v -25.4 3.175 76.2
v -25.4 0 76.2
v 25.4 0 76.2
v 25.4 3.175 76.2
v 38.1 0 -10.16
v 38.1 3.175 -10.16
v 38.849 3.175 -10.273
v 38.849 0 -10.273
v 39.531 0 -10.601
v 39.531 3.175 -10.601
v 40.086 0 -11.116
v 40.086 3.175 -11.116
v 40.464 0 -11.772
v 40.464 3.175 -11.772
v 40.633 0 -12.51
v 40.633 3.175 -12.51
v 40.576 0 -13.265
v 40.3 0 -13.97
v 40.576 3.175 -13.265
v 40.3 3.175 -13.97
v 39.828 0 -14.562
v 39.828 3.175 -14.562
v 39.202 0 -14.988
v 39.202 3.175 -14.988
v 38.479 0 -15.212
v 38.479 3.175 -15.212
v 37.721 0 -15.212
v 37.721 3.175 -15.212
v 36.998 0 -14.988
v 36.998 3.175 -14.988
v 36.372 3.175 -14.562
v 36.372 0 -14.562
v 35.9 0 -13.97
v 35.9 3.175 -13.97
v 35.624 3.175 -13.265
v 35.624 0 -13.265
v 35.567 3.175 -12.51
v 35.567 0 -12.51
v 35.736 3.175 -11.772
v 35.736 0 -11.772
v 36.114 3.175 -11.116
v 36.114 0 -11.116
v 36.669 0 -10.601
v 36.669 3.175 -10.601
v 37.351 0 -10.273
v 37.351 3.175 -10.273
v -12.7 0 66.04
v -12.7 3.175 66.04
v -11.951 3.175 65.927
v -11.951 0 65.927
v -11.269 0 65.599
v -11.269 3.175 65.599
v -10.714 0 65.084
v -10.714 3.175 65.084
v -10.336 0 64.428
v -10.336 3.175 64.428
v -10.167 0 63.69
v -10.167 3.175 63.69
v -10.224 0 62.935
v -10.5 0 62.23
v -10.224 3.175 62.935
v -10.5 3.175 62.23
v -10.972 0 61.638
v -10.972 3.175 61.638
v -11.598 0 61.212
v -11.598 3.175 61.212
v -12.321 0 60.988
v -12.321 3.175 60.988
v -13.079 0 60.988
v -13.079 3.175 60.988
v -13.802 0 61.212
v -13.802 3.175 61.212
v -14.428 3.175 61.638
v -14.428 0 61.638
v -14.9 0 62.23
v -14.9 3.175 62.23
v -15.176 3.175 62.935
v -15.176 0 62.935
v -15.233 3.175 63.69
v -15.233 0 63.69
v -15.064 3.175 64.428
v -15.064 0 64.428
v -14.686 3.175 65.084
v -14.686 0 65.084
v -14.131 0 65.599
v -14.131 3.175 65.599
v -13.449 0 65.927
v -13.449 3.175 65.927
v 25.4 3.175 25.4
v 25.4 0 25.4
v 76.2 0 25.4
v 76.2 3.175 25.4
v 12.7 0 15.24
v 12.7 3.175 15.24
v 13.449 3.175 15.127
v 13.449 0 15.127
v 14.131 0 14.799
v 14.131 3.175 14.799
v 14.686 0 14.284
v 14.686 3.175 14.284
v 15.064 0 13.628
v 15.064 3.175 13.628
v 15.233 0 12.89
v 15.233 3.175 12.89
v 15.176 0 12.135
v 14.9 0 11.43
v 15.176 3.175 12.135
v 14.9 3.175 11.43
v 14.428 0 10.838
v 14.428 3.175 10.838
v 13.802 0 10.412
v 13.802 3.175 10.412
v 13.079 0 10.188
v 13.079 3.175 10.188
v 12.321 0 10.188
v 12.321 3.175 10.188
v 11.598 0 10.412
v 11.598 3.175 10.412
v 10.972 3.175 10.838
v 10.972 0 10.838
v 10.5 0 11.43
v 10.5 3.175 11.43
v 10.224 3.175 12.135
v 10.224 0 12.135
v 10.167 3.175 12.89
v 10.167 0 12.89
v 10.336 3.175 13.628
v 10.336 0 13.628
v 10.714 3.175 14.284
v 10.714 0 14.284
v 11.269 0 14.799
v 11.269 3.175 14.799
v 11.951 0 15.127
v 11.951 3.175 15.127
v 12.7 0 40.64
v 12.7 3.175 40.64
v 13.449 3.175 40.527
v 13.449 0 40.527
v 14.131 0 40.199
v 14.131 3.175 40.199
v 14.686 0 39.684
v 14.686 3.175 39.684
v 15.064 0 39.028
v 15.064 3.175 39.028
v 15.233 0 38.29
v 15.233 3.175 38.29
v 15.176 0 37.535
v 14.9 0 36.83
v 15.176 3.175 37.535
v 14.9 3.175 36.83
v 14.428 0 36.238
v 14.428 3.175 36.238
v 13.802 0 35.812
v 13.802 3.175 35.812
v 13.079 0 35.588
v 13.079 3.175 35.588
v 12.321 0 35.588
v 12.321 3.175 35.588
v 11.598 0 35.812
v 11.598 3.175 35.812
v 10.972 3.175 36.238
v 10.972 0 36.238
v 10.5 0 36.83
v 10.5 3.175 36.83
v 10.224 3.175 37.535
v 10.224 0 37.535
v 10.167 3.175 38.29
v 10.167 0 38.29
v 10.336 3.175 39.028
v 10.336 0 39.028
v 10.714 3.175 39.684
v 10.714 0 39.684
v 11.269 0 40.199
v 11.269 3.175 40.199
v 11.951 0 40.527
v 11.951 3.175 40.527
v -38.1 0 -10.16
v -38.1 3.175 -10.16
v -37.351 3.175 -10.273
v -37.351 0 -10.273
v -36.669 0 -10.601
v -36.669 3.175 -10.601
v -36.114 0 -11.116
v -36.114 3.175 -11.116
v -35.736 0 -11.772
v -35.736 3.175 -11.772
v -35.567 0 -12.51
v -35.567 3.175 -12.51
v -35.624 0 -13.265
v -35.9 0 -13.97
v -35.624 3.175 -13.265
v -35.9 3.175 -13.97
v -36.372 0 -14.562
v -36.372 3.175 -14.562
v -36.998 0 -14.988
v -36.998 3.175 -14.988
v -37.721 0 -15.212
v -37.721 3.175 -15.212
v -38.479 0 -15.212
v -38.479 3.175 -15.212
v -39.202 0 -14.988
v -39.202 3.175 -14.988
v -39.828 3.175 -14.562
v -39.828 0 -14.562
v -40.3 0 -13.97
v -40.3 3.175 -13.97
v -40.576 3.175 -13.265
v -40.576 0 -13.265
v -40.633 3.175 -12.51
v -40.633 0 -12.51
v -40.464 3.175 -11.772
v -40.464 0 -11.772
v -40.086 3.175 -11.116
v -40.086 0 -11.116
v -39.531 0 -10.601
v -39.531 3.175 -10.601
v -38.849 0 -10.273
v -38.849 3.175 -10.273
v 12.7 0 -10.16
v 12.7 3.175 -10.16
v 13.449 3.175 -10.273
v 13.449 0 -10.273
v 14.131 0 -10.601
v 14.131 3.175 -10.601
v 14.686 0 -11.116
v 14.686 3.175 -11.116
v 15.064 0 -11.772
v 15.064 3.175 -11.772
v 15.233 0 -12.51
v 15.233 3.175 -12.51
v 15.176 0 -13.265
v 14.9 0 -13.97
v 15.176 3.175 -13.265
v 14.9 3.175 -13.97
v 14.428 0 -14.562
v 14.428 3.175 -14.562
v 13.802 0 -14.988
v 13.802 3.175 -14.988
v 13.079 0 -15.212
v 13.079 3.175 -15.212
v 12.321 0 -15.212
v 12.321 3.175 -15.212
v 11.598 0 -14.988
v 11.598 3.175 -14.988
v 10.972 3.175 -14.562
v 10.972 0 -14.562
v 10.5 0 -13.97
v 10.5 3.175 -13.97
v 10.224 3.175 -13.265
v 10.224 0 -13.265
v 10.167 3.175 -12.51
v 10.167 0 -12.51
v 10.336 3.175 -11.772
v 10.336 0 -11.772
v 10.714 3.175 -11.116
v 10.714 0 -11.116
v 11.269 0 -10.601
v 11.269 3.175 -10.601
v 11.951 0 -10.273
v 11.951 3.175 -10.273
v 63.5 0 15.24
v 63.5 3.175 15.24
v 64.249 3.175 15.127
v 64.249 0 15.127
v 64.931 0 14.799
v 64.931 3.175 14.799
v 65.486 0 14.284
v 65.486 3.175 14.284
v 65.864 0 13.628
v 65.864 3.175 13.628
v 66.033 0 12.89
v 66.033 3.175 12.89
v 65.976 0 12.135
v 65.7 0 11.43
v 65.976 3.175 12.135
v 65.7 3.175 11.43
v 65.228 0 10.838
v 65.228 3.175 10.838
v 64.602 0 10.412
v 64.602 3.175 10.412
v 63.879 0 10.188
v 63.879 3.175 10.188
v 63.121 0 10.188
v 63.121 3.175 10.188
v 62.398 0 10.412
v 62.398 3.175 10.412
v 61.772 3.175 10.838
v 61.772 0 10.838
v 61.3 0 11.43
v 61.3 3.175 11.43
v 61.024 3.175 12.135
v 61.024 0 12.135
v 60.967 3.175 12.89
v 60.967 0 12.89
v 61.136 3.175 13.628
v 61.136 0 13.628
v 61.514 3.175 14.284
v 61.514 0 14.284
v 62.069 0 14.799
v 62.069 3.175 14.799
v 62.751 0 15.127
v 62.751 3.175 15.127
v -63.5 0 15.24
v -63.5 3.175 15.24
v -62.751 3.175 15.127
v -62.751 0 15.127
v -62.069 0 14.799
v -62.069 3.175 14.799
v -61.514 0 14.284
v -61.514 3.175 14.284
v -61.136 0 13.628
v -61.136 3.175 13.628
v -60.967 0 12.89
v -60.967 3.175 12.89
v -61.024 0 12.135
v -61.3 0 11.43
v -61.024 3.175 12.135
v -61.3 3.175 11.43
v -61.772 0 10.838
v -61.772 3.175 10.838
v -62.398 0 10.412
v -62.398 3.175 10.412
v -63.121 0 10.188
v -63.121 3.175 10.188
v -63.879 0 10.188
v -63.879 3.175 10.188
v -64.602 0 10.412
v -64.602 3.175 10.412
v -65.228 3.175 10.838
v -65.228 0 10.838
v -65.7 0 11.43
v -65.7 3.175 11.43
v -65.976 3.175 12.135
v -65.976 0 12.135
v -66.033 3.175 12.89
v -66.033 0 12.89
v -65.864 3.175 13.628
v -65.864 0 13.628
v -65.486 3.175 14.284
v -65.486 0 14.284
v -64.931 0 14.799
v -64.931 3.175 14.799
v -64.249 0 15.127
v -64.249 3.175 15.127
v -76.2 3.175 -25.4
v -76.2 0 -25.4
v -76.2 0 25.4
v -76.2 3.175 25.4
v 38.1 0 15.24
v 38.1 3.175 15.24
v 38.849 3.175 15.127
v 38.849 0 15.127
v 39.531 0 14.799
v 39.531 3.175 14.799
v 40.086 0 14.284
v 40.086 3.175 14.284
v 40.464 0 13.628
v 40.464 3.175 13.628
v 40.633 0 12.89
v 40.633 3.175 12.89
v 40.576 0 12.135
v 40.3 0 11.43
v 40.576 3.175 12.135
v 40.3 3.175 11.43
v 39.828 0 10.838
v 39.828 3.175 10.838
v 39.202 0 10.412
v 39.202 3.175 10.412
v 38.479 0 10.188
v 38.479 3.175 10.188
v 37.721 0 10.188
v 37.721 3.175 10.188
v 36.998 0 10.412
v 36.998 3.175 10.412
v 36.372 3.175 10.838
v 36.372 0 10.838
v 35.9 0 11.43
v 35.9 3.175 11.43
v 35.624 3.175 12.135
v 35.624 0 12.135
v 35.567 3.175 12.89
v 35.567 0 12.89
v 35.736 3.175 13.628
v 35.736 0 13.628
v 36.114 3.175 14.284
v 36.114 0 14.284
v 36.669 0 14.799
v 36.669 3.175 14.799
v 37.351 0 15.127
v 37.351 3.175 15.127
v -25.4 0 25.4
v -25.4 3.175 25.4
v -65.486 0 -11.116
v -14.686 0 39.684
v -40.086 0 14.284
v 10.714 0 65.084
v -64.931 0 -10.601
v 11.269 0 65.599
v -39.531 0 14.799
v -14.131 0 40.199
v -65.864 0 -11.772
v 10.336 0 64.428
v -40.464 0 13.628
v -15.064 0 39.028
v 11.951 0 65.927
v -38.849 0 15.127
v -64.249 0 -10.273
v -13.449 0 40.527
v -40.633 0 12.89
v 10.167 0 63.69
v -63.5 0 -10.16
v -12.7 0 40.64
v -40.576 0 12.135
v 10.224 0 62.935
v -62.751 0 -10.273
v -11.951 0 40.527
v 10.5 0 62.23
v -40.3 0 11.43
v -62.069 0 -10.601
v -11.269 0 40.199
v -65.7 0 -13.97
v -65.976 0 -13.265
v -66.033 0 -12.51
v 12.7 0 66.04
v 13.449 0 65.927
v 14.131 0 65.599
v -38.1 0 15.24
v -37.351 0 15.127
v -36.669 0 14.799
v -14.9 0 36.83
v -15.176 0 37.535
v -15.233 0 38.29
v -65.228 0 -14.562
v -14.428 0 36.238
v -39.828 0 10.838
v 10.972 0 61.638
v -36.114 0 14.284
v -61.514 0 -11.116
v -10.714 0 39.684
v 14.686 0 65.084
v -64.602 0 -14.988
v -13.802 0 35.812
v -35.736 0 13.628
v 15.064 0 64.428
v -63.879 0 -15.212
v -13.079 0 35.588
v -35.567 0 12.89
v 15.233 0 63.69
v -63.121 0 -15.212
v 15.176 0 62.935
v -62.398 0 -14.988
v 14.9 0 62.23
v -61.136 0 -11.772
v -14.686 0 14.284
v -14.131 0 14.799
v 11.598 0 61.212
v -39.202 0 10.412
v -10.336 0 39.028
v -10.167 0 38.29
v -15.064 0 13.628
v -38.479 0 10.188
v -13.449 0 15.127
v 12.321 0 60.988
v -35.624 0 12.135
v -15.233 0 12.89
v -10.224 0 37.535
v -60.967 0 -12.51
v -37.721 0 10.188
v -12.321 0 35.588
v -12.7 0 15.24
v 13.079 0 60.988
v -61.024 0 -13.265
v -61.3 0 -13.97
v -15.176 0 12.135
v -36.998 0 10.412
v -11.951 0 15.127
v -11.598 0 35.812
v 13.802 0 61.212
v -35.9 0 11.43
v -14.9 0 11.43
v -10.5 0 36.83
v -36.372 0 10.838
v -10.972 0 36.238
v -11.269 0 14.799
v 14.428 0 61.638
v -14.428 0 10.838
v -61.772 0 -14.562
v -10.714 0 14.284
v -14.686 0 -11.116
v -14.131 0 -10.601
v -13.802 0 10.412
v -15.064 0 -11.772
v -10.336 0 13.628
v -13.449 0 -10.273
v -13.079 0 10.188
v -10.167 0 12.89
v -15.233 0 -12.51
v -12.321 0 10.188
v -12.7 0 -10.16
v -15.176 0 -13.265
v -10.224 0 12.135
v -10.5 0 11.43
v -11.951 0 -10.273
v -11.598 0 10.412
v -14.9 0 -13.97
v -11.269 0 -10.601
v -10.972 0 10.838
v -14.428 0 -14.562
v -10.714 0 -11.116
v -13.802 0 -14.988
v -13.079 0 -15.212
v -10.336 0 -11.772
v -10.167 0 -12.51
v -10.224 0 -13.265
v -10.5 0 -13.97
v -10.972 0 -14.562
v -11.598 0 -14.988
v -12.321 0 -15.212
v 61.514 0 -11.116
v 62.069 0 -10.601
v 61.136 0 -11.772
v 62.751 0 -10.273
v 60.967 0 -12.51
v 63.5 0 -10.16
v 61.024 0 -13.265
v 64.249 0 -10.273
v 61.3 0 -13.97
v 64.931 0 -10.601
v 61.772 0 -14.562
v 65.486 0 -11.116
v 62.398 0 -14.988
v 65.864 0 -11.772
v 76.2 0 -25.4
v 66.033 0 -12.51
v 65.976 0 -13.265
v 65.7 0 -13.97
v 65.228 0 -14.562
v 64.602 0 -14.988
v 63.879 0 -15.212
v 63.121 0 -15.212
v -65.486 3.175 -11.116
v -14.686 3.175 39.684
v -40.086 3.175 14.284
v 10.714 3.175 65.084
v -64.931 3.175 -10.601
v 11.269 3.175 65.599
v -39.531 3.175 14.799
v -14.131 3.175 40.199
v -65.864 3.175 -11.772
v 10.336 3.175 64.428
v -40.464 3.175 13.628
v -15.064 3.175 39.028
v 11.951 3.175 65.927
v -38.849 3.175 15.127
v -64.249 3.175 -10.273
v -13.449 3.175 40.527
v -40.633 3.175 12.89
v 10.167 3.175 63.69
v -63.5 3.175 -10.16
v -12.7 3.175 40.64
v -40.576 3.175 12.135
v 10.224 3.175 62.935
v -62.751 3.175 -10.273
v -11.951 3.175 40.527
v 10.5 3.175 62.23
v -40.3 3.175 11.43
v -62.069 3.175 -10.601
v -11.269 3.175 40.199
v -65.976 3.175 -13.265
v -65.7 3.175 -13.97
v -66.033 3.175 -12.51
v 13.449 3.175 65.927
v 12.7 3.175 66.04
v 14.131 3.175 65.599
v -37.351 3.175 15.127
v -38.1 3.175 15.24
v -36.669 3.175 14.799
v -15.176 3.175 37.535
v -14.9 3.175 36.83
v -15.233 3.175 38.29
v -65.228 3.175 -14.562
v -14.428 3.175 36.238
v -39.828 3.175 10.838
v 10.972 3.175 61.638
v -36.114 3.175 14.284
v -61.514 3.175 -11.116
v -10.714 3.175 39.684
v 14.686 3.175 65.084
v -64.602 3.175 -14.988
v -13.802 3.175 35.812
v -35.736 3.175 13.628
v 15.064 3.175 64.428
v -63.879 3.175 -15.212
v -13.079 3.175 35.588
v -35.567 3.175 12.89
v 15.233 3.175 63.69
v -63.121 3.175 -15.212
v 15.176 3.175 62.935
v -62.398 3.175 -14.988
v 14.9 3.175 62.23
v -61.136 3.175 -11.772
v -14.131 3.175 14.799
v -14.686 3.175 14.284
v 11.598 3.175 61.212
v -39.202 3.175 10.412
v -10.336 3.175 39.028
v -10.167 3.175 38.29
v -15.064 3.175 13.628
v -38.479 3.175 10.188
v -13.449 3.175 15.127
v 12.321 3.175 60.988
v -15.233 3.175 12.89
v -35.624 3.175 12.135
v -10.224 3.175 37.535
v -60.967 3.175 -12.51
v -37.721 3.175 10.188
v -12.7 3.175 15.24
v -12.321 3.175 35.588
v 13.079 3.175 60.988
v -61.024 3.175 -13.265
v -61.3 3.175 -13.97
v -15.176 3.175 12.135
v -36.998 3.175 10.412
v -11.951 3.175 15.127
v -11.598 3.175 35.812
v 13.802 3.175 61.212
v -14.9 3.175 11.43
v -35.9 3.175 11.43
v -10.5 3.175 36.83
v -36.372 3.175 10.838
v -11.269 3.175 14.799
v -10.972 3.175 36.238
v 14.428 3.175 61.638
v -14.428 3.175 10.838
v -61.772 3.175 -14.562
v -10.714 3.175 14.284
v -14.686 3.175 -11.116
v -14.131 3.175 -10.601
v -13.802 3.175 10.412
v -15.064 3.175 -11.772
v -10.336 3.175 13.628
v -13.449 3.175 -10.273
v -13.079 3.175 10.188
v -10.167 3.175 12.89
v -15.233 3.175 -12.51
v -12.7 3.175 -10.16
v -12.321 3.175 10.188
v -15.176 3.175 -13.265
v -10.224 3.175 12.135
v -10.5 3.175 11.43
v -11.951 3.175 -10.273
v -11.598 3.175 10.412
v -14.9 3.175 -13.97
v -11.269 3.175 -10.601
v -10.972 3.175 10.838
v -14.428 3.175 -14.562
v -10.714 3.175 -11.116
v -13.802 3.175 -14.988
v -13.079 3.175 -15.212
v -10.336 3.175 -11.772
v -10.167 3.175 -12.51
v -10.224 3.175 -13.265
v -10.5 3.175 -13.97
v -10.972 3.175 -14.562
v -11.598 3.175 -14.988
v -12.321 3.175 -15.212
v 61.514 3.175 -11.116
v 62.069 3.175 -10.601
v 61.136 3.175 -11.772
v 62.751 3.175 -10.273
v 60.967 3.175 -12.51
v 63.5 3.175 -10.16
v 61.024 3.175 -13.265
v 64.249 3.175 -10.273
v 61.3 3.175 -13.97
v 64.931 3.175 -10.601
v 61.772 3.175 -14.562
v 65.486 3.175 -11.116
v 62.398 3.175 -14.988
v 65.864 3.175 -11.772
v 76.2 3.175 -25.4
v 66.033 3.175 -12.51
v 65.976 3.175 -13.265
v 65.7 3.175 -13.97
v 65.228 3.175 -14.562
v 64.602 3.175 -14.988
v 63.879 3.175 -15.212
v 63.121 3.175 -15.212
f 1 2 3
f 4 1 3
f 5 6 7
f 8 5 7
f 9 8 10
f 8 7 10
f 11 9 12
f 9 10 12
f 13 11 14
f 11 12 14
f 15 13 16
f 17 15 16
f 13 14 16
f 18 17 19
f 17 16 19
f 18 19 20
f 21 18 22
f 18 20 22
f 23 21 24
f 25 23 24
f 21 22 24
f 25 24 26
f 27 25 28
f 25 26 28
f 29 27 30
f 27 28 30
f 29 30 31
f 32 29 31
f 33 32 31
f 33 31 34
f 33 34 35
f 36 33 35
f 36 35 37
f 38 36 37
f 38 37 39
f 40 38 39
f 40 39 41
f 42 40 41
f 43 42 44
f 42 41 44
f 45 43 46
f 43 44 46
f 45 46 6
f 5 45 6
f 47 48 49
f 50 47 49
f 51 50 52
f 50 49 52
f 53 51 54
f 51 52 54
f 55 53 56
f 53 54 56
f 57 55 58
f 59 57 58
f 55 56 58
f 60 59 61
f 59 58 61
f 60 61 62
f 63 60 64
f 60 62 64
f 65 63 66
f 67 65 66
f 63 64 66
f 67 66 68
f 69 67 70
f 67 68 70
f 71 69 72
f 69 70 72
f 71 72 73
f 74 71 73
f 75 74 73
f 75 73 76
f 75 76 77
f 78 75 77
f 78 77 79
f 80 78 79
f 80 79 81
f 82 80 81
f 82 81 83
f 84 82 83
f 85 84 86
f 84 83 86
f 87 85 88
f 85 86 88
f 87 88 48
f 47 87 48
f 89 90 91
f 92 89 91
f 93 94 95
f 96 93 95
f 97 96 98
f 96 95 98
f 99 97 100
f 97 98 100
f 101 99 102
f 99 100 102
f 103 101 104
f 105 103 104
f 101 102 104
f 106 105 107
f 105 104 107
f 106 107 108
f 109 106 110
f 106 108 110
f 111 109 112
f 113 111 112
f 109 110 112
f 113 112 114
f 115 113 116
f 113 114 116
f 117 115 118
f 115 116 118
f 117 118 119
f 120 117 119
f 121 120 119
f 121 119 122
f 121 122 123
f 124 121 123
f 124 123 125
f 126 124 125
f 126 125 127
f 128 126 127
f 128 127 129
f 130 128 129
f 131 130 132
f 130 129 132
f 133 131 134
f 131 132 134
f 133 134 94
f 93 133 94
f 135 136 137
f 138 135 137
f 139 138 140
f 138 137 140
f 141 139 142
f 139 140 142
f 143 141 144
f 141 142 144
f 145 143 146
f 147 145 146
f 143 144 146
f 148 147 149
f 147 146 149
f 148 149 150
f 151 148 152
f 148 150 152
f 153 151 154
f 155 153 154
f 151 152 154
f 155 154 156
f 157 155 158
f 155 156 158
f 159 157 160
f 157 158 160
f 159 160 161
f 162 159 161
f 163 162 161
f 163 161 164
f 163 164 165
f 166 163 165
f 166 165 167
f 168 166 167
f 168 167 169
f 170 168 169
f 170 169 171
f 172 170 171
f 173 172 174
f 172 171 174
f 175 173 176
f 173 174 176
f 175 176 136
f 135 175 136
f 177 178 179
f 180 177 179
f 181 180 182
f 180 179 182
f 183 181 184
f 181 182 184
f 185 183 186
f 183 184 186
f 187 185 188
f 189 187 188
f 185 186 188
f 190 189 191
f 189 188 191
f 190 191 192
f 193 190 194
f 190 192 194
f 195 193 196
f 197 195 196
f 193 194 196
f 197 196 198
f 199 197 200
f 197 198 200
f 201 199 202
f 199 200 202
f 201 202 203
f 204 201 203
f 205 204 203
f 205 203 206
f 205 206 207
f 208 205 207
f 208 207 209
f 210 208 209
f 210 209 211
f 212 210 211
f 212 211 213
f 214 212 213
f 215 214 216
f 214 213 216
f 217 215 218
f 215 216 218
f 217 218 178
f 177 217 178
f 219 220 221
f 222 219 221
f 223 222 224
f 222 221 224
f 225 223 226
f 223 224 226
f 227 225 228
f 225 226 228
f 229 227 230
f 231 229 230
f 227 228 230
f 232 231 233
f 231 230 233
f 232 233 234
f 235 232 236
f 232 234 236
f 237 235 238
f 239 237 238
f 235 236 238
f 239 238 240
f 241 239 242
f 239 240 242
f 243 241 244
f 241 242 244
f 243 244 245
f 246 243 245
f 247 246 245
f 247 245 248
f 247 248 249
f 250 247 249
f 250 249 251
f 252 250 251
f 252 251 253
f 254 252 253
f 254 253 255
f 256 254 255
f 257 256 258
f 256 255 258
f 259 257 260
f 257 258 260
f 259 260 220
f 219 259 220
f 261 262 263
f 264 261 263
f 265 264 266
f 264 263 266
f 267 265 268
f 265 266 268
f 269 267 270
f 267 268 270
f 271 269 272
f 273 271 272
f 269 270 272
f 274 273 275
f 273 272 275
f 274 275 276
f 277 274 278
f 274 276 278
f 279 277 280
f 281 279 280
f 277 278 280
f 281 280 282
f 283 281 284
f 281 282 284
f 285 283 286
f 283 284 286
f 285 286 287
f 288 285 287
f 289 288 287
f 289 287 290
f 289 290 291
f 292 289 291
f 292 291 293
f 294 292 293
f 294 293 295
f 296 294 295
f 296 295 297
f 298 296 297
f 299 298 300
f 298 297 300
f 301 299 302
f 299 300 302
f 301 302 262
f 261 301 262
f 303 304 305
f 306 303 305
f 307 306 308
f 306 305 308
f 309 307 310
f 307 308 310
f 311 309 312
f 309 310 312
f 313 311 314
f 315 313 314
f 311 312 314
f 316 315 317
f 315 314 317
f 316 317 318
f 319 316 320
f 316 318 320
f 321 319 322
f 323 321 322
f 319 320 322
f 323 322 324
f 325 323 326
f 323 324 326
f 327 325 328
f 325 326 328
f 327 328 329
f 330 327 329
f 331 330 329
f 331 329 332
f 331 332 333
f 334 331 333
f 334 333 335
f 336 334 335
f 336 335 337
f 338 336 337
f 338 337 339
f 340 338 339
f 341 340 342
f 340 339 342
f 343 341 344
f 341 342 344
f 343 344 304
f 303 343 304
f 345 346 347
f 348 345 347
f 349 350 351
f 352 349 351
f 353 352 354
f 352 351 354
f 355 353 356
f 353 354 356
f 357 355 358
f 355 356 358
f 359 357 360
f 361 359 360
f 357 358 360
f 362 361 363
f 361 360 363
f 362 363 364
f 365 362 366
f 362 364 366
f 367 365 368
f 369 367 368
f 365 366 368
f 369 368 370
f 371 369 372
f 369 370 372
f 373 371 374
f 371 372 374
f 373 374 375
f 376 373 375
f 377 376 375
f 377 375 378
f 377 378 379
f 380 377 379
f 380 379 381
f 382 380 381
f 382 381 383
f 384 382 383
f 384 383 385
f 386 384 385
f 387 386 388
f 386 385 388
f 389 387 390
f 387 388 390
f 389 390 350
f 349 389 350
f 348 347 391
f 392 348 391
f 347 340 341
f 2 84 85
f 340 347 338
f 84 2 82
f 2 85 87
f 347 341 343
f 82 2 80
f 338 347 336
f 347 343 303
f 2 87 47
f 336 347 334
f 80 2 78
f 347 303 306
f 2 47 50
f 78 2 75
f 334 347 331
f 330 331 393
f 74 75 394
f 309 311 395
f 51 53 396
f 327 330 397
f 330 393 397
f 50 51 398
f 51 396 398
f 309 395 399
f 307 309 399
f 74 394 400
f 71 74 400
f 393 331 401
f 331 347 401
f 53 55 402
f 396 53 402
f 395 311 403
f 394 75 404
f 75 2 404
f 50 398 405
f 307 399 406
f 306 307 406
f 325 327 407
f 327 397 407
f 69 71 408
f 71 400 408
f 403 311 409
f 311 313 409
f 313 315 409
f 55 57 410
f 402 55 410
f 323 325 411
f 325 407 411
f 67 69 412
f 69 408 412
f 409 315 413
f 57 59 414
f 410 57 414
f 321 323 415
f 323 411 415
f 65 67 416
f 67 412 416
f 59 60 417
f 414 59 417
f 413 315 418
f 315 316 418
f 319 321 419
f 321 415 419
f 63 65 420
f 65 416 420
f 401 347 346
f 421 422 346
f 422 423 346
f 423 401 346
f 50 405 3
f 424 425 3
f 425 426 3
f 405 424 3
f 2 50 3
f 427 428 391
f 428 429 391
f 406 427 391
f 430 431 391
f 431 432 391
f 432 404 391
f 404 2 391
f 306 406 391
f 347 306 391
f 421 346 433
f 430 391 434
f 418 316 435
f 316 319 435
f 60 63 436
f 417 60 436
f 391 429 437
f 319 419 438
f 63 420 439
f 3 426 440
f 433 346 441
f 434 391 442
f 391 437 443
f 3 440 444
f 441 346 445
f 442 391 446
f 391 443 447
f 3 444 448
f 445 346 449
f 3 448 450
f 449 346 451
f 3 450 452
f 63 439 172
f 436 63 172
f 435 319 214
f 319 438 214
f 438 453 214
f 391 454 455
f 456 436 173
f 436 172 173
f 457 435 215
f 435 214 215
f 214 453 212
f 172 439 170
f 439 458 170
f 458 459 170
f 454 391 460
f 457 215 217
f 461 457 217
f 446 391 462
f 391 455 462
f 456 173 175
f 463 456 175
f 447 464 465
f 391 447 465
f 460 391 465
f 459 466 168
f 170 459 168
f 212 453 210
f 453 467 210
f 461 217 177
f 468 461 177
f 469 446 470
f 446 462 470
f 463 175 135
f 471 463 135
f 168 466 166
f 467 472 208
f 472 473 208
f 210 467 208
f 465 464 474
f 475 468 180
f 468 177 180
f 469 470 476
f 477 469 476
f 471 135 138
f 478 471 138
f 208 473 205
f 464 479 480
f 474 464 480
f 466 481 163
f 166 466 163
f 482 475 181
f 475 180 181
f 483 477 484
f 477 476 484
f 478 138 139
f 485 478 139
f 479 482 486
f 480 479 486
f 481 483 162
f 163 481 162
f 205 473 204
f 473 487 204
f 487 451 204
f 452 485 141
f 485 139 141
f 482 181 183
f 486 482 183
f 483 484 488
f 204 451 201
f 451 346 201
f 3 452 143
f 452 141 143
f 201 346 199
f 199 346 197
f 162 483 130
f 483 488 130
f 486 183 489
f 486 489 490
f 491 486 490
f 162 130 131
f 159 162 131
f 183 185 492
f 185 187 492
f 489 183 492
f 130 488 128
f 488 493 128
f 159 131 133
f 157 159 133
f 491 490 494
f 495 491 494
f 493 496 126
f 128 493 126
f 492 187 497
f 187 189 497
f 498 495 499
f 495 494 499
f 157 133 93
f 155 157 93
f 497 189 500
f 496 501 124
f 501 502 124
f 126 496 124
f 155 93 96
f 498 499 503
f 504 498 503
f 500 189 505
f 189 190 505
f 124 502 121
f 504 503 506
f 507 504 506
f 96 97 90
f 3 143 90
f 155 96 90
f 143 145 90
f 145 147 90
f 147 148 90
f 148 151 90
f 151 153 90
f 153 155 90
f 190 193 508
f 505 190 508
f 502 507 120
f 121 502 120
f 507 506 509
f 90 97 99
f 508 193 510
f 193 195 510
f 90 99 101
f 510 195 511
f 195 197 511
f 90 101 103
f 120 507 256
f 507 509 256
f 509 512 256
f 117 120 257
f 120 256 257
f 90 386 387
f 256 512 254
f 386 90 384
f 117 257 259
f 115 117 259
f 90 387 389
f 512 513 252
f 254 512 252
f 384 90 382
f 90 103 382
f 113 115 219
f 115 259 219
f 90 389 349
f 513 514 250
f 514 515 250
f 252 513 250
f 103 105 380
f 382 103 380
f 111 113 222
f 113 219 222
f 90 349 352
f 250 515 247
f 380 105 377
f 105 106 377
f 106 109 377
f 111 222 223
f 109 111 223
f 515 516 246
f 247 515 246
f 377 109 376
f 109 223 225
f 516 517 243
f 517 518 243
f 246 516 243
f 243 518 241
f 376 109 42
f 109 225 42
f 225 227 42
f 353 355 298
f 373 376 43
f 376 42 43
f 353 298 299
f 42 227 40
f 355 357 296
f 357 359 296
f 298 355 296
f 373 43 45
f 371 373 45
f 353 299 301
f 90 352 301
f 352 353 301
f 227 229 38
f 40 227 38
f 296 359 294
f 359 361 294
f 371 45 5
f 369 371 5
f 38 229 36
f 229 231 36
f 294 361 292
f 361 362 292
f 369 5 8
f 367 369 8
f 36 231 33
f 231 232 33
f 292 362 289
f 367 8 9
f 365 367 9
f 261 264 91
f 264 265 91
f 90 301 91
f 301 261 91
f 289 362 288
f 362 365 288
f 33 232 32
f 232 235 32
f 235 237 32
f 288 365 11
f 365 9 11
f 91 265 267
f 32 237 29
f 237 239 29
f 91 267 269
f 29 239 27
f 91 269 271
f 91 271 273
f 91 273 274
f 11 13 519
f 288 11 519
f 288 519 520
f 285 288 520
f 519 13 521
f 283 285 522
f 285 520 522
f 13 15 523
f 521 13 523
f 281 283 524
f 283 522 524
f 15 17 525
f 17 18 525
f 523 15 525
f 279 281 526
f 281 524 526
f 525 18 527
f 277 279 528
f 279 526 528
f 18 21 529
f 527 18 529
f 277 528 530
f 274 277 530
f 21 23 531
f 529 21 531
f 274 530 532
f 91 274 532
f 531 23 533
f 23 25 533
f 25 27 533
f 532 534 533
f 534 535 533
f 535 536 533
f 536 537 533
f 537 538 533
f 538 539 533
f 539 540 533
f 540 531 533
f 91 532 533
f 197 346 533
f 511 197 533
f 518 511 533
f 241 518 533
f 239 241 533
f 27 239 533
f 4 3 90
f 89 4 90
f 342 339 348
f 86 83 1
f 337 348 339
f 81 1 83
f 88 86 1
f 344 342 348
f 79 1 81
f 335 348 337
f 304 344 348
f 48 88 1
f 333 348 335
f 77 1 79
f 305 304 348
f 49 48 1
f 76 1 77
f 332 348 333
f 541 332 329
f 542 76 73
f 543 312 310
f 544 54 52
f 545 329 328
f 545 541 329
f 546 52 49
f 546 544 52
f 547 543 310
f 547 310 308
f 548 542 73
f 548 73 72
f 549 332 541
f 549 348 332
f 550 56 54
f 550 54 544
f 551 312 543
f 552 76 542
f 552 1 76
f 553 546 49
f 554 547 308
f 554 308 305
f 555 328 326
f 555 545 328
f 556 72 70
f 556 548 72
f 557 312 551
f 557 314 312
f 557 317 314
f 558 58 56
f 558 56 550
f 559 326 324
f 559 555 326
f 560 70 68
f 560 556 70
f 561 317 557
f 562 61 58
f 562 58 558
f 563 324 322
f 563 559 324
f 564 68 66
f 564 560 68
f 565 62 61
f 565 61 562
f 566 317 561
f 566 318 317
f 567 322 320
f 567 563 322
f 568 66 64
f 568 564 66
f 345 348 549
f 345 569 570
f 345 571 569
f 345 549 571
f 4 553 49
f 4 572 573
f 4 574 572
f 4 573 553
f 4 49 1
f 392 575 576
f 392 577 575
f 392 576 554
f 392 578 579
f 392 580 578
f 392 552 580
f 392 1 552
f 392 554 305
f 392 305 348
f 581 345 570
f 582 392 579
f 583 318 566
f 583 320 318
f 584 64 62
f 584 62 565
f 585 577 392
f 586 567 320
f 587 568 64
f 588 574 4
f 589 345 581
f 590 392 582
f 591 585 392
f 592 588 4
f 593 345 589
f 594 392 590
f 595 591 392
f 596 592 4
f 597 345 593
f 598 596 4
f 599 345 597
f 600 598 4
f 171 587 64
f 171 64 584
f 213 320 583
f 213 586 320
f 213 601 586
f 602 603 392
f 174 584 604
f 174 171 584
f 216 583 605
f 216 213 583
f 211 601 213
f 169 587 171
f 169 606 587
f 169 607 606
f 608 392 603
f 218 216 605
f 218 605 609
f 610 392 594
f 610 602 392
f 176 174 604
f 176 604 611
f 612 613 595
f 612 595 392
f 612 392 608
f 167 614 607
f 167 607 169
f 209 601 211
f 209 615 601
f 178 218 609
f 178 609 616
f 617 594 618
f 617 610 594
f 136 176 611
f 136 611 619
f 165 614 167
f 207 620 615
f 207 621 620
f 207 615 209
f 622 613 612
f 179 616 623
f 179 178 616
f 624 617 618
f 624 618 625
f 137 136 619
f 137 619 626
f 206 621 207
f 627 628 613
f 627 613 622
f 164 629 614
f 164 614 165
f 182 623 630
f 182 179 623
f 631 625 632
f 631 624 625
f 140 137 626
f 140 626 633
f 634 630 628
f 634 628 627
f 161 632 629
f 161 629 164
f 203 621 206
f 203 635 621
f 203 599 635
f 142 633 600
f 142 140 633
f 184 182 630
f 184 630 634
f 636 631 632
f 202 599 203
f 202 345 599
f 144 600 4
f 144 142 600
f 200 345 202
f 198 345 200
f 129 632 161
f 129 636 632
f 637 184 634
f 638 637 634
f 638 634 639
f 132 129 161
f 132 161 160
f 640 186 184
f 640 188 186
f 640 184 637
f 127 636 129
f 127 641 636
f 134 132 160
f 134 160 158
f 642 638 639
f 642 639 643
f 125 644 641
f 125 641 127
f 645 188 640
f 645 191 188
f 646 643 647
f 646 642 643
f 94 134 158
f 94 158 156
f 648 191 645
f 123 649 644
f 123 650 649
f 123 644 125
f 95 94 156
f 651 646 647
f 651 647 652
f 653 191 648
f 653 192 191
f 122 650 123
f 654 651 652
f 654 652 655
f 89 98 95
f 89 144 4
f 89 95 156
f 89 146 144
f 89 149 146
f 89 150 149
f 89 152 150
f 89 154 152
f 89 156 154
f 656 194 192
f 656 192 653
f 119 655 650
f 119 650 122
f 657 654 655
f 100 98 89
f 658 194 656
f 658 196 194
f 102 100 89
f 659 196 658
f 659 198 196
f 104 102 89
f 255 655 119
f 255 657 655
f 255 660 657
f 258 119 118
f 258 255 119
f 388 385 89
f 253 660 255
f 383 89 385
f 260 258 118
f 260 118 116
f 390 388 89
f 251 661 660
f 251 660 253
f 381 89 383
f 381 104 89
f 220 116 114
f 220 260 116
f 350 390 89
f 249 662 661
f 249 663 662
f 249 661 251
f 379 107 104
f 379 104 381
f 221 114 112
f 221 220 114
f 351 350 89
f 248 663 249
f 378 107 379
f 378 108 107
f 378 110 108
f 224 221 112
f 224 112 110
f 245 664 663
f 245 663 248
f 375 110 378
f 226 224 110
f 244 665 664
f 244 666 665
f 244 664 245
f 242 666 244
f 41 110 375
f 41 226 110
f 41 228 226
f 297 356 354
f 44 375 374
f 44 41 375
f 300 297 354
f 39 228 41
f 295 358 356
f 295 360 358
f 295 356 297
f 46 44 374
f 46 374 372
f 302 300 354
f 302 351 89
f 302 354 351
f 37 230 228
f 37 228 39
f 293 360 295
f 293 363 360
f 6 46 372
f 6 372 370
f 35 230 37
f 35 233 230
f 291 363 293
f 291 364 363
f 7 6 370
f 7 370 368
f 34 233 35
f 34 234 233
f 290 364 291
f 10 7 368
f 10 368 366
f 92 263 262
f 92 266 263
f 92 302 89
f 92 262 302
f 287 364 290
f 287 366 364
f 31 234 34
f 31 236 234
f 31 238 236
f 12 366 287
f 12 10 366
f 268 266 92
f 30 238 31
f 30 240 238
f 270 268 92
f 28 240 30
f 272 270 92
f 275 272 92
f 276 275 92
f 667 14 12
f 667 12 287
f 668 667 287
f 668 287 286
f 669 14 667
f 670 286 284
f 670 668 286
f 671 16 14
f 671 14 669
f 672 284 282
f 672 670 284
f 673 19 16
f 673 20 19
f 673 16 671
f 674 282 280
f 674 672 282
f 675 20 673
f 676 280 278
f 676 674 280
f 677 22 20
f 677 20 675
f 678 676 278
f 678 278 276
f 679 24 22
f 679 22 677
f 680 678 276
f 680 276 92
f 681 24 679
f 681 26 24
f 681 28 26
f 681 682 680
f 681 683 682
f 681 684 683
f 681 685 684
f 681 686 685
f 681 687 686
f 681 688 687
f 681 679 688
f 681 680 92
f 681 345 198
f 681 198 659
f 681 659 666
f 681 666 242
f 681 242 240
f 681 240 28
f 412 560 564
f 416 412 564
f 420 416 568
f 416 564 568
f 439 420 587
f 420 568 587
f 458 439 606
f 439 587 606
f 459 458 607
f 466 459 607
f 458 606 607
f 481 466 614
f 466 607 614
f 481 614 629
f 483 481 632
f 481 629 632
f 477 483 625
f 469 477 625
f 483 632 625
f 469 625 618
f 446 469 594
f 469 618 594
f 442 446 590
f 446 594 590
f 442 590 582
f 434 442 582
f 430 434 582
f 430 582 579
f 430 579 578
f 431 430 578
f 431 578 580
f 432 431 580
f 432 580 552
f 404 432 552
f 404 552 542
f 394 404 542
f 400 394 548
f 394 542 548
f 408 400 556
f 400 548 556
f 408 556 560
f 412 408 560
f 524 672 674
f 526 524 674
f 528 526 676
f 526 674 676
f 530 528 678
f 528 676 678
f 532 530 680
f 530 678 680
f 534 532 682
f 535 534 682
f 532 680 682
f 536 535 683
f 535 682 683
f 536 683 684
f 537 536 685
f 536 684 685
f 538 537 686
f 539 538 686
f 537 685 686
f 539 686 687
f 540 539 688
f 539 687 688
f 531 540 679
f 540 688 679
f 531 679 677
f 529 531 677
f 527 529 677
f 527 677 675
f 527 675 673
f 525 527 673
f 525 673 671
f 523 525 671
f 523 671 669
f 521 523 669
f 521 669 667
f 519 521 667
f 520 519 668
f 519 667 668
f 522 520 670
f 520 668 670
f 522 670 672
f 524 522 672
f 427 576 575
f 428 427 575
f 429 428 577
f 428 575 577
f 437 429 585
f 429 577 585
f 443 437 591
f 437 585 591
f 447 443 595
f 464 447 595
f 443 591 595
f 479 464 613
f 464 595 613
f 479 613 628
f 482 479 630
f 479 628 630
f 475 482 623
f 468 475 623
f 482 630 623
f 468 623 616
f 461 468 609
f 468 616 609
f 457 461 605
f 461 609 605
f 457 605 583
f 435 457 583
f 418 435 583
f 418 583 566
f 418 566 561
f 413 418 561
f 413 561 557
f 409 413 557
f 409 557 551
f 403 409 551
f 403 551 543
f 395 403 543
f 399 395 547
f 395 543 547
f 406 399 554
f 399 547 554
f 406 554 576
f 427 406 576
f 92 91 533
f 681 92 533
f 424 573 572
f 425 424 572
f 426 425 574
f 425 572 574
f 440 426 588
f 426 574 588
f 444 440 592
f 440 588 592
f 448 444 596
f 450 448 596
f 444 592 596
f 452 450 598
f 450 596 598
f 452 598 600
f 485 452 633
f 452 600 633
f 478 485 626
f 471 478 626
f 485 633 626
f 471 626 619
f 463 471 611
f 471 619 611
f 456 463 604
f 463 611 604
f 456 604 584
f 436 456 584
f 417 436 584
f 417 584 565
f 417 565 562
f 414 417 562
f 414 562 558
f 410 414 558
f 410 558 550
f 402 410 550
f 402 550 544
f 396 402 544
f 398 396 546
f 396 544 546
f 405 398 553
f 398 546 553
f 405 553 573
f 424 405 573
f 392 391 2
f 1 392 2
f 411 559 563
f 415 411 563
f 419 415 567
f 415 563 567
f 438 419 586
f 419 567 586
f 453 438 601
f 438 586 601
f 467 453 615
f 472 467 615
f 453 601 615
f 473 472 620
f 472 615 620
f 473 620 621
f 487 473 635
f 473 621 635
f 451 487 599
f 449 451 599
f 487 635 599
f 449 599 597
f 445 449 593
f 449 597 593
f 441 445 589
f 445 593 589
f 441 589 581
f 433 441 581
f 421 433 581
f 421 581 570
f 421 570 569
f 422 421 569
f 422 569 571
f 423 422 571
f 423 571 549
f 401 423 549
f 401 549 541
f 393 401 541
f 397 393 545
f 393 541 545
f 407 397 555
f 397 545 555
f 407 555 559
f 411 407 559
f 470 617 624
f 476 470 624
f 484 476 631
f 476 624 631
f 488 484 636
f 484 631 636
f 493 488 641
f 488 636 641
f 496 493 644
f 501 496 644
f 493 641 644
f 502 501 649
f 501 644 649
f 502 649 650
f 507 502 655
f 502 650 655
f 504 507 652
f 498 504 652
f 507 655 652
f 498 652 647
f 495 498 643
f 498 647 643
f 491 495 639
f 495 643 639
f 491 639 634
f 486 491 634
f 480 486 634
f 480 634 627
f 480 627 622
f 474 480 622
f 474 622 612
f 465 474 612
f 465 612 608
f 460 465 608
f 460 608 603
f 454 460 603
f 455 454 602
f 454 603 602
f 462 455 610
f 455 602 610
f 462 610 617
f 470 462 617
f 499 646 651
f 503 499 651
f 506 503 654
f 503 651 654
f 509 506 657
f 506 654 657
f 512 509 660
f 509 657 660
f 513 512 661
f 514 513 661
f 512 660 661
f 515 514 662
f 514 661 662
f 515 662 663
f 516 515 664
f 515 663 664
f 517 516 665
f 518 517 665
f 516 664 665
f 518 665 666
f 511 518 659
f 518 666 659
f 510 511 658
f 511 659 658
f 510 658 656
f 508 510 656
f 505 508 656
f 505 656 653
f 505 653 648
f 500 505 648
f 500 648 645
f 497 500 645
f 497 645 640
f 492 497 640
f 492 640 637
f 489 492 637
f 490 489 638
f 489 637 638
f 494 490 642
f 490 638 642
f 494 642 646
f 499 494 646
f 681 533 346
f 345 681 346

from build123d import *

# Parameters (mm, degrees)
BOSS_EXTRUDE1_DEPTH  = 3.175
SKETCH2_R            = 2.54
CUT_EXTRUDE1_DEPTH   = 3.175
LPATTERN1_COUNT      = 6
LPATTERN1_PITCH      = 25.4
LPATTERN1_COUNT_DIR2 = 2
LPATTERN1_PITCH_DIR2 = 25.4
SKETCH3_R            = 2.54
CUT_EXTRUDE2_DEPTH   = 3.175
LPATTERN2_COUNT      = 2
LPATTERN2_PITCH      = 25.4
LPATTERN2_COUNT_DIR2 = 2
LPATTERN2_PITCH_DIR2 = 25.4


with BuildPart() as part:
    # Sketch1 → Boss-Extrude1 (new body)
    with BuildSketch(Plane(origin=(0, 0, 0), x_dir=(1, 0, 0), z_dir=(0, 1, 0))):
        Polygon((25.4, -25.4), (76.2, -25.4), (76.2, 25.4), (-76.2, 25.4), (-76.2, -25.4), (-25.4, -25.4), (-25.4, -76.2), (25.4, -76.2), align=None)
    extrude(amount=BOSS_EXTRUDE1_DEPTH)

    # Sketch2 → Cut-Extrude1 (cut)
    with BuildSketch(Plane(origin=(0, 3.175, 0), x_dir=(1, 0, 0), z_dir=(0, 1, 0))):
        with Locations(Location((-63.5, 12.7, 0), (0, 0, 270))):
            Circle(SKETCH2_R)
    cut_extrude1 = extrude(amount=-CUT_EXTRUDE1_DEPTH, mode=Mode.SUBTRACT)

    # LPattern1: Cut-Extrude1 6 × 2
    with Locations(*[(i * LPATTERN1_PITCH, 0, j * LPATTERN1_PITCH_DIR2) for i in range(LPATTERN1_COUNT) for j in range(LPATTERN1_COUNT_DIR2) if (i, j) != (0, 0)]):
        add(cut_extrude1, mode=Mode.SUBTRACT)

    # Sketch3 → Cut-Extrude2 (cut)
    with BuildSketch(Plane(origin=(0, 3.175, 0), x_dir=(1, 0, 0), z_dir=(0, 1, 0))):
        with Locations(Location((-12.7, -63.5, 0), (0, 0, 270))):
            Circle(SKETCH3_R)
    cut_extrude2 = extrude(amount=-CUT_EXTRUDE2_DEPTH, mode=Mode.SUBTRACT)

    # LPattern2: Cut-Extrude2 2 × 2
    with Locations(*[(i * LPATTERN2_PITCH, 0, -j * LPATTERN2_PITCH_DIR2) for i in range(LPATTERN2_COUNT) for j in range(LPATTERN2_COUNT_DIR2) if (i, j) != (0, 0)]):
        add(cut_extrude2, mode=Mode.SUBTRACT)


solid = part.part
